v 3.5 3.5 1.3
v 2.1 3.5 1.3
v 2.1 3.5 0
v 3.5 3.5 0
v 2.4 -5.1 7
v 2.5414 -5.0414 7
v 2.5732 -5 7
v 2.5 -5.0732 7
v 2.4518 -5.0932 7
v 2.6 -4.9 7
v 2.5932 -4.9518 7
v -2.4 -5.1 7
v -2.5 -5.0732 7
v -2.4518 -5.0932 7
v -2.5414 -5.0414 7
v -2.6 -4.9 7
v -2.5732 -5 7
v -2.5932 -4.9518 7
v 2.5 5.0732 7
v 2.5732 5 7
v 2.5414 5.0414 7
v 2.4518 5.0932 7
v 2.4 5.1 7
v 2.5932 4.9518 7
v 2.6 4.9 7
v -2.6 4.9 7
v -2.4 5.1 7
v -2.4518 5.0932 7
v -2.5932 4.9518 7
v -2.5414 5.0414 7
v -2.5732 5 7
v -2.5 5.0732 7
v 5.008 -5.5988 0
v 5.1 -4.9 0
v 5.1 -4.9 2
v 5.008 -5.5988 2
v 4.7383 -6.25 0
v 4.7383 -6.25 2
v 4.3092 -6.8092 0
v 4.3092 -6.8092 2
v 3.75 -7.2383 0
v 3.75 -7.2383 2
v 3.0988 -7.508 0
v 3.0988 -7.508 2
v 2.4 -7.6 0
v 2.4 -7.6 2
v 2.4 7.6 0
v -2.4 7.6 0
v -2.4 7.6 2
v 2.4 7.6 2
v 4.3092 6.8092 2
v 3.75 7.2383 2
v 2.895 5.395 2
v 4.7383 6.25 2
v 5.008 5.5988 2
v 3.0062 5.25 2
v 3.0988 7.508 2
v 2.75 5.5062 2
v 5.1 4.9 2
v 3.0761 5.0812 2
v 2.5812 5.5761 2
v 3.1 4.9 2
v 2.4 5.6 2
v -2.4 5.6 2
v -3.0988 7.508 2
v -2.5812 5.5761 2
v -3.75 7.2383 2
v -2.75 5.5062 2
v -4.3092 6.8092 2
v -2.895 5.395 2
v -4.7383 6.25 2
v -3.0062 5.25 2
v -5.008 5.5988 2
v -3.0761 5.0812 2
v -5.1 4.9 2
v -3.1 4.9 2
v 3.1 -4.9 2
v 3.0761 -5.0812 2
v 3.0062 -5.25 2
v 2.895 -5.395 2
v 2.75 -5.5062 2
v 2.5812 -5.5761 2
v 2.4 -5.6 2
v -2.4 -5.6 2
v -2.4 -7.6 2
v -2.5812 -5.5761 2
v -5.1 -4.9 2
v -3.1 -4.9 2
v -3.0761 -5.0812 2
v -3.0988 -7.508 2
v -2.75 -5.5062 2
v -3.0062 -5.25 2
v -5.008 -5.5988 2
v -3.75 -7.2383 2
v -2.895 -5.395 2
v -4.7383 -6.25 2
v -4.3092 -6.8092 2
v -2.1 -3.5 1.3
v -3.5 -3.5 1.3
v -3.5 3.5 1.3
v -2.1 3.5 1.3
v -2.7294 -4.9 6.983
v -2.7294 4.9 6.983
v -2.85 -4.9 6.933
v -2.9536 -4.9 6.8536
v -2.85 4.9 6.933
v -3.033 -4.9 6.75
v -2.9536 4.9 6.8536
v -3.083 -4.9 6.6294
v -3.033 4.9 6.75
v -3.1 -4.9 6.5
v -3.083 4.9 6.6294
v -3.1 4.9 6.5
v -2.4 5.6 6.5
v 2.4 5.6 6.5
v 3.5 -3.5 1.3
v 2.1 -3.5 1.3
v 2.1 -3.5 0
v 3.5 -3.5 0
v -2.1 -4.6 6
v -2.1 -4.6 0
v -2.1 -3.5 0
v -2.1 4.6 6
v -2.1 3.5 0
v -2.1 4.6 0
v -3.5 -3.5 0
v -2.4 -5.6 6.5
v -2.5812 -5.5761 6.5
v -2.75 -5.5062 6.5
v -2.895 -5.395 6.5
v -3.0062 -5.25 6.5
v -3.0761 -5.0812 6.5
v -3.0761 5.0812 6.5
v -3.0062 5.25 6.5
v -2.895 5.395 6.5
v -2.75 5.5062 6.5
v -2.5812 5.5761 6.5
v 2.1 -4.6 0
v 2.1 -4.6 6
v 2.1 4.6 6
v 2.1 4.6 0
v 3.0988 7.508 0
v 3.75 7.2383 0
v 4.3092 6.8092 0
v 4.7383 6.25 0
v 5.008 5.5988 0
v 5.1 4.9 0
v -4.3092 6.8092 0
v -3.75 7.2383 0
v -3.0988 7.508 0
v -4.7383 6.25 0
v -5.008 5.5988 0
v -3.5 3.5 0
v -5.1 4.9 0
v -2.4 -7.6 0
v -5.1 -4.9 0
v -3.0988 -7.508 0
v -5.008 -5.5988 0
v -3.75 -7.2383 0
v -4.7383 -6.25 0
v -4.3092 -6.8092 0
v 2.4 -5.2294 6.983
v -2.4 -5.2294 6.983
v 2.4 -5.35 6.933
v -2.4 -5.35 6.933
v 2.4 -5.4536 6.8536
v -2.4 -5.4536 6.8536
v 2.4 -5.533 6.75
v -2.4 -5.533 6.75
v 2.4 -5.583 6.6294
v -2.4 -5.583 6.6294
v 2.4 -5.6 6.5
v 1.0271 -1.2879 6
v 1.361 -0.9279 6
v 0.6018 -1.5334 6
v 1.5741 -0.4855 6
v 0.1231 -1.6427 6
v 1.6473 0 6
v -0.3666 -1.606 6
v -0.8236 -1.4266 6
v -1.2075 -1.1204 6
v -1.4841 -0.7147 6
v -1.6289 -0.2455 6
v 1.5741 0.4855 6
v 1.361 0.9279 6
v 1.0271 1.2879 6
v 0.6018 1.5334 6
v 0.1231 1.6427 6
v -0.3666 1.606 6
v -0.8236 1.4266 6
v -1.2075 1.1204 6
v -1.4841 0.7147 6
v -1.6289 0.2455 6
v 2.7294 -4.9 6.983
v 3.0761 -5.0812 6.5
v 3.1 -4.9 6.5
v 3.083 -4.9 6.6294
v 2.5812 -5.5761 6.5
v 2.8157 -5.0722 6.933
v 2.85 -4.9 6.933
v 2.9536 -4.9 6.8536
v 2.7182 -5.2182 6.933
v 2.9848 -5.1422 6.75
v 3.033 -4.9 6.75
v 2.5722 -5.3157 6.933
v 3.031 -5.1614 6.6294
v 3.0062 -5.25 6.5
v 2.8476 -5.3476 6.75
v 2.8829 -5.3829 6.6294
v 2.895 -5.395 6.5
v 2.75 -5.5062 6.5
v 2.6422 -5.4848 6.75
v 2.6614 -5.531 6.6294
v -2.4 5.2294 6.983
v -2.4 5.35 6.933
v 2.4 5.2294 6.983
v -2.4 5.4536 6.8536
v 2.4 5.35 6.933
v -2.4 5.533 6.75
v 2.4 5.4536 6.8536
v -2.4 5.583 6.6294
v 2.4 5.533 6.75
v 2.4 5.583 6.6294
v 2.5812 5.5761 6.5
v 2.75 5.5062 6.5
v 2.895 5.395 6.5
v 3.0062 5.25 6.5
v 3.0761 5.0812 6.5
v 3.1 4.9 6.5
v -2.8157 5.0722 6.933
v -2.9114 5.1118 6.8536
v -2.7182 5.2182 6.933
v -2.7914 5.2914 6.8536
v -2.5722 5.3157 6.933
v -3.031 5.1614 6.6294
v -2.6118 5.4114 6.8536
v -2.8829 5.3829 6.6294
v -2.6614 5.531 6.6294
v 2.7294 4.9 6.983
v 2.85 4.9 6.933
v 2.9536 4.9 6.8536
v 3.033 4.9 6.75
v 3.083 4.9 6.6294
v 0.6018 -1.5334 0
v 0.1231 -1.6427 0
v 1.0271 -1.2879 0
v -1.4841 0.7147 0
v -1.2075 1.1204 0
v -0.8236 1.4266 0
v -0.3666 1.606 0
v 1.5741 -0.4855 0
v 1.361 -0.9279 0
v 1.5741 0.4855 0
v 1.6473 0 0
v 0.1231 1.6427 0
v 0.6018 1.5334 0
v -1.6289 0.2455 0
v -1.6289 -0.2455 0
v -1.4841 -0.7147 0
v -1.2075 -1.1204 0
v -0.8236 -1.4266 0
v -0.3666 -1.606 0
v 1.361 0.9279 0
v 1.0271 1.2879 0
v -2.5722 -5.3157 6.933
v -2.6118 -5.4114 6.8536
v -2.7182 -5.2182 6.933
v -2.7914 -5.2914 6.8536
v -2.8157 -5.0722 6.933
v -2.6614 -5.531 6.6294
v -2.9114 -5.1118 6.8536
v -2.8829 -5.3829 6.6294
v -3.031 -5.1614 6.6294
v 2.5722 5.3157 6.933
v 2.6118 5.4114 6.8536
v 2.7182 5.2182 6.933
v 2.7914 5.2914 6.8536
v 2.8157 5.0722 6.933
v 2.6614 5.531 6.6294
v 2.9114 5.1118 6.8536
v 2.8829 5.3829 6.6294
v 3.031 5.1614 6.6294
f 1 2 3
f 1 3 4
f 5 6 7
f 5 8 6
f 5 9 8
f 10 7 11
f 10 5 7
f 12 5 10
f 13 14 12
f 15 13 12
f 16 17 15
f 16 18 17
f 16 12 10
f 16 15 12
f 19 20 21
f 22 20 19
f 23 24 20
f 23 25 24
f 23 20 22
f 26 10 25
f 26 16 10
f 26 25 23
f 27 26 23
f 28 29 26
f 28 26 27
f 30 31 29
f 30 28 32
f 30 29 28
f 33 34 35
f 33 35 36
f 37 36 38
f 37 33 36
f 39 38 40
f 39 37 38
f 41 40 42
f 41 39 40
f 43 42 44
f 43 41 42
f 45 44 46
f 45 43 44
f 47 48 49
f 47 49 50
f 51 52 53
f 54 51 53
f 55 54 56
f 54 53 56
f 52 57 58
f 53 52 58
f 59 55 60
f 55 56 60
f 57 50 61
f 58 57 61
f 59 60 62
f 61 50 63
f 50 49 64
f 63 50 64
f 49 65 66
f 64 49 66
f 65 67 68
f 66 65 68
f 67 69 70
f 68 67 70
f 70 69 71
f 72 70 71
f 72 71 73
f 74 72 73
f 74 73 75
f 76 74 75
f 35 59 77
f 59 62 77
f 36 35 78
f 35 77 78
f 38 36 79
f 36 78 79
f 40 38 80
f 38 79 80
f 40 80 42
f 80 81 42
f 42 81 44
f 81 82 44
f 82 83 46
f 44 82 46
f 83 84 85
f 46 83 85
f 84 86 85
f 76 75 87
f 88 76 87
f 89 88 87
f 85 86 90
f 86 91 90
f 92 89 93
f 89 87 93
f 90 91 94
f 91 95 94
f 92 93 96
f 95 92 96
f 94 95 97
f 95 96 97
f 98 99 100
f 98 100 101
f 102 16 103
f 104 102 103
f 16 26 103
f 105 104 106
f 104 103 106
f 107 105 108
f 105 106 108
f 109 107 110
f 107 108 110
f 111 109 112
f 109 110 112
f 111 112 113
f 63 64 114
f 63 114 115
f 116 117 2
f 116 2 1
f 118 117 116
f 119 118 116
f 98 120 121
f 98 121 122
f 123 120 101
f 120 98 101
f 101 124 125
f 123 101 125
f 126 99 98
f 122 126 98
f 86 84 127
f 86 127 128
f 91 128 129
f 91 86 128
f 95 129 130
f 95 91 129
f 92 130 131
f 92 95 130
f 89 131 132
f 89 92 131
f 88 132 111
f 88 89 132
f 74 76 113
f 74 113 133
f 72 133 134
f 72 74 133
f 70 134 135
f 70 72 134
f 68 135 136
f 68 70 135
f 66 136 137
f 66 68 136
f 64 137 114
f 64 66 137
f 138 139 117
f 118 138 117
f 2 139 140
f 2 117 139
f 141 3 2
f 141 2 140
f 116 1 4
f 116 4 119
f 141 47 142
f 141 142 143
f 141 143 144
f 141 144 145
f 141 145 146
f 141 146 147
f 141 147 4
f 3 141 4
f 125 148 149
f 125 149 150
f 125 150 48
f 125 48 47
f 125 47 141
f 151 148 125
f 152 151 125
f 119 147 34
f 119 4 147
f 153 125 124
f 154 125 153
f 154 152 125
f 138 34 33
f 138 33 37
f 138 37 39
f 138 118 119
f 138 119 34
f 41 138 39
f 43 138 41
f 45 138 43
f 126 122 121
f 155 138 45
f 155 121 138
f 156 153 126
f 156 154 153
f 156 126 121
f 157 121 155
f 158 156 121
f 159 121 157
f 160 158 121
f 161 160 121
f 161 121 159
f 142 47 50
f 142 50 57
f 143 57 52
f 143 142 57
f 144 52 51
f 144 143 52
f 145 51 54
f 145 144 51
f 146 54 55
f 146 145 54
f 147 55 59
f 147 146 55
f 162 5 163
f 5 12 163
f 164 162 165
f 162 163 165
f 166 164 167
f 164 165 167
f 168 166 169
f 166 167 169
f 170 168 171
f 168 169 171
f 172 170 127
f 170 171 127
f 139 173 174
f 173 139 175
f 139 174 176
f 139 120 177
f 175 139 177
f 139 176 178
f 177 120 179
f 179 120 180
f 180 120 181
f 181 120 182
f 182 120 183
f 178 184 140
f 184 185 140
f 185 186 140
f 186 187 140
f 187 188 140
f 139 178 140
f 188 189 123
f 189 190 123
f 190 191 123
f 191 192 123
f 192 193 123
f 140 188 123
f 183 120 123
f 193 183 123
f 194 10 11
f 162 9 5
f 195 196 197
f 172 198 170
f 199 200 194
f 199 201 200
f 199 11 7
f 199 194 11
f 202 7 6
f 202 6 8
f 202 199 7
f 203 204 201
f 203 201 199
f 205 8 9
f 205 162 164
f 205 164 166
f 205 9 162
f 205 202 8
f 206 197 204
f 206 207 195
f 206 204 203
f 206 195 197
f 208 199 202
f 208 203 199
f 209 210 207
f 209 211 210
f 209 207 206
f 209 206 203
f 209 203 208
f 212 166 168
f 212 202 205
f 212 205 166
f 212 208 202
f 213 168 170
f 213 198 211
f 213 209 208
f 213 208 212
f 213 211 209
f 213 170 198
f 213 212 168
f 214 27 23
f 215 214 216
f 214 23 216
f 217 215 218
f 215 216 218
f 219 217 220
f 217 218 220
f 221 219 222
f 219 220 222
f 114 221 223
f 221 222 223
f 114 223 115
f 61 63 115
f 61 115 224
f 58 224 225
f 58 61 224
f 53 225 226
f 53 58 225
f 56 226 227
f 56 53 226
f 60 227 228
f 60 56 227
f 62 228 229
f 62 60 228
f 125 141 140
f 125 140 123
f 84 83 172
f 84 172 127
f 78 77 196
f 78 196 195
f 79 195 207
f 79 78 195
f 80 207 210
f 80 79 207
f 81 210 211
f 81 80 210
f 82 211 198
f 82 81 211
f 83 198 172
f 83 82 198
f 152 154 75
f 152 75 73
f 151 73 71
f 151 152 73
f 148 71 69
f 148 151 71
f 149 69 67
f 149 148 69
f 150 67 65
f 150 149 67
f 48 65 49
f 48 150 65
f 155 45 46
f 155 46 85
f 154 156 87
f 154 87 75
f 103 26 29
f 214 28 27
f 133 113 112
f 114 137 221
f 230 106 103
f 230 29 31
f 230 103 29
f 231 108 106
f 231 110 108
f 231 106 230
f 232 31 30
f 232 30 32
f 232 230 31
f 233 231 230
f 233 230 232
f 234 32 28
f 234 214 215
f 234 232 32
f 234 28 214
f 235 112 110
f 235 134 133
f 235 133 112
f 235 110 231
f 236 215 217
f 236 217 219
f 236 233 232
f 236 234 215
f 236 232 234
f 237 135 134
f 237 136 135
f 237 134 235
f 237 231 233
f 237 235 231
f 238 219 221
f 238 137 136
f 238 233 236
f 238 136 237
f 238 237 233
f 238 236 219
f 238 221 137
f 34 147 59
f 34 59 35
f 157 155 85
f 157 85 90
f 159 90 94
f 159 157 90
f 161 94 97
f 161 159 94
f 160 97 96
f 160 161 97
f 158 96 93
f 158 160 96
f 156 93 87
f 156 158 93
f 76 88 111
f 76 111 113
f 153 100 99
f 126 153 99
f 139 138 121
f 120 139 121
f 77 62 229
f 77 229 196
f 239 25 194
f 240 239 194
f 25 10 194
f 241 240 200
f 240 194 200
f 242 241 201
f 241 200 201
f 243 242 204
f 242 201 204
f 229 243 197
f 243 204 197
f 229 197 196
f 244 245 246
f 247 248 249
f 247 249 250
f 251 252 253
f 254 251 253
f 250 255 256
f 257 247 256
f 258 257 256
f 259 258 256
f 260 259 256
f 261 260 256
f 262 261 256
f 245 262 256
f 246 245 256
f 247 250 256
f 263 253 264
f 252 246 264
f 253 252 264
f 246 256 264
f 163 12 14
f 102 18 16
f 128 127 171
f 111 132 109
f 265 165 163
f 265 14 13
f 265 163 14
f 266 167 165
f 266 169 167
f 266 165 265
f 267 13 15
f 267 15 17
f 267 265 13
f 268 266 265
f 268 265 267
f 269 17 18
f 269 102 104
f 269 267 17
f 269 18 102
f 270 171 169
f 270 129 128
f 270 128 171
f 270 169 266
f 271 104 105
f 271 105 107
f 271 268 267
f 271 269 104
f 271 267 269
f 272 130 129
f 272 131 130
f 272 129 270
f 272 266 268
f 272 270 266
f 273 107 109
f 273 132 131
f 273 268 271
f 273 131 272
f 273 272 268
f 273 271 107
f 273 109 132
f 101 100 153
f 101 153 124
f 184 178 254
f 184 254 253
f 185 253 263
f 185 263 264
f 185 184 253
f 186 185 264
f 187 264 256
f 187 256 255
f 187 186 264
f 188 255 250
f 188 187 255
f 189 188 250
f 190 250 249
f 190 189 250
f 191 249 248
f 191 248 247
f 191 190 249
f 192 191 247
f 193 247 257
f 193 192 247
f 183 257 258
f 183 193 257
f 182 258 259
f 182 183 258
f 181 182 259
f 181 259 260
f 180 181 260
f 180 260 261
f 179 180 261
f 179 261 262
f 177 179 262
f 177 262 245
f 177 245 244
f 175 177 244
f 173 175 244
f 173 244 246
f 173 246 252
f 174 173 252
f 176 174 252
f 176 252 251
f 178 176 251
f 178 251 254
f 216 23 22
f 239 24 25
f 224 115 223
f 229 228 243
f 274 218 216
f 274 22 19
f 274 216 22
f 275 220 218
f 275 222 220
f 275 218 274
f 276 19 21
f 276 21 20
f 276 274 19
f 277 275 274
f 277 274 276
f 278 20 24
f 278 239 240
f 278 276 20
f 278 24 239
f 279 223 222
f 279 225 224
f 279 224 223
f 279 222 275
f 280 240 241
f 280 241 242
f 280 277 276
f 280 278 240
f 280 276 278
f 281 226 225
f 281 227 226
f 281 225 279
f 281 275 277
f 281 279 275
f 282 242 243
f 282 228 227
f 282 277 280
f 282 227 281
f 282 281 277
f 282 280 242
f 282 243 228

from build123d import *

# Parameters (mm, degrees)
CROQUIS1_W              = 9.2
CROQUIS1_H              = 4.2
SALIENTE_EXTRUIR1_DEPTH = 7
SALIENTE_EXTRUIR2_DEPTH = 2
SALIENTE_EXTRUIR3_START = 7
CROQUIS1_5_W            = 9.2
CROQUIS1_5_H            = 4.2
CROQUIS1_5_R            = 1.647263677
SALIENTE_EXTRUIR3_DEPTH = 1
SALIENTE_EXTRUIR4_START = 7
CROQUIS1_6_R            = 1.647263677
SALIENTE_EXTRUIR4_DEPTH = 7
CORTAR_EXTRUIR1_START   = -1.3
CROQUIS2_W              = 4.2
CROQUIS2_H              = 7
CROQUIS2_R              = 1.647263677
CROQUIS2_W_2            = 1.4
CORTAR_EXTRUIR1_DEPTH   = 1.3
REDONDEO1_R             = 0.5


with BuildPart() as part:
    # Croquis1 → Saliente-Extruir1 (new body)
    with BuildSketch(Plane(origin=(0, 0, 0), x_dir=(0, 1, 0), z_dir=(0, 0, 1))):
        with BuildLine():
            ThreePointArc((-5.6, 2.4), (-5.394974747, 2.894974747), (-4.9, 3.1))
            Line((-4.9, 3.1), (4.9, 3.1))
            ThreePointArc((4.9, 3.1), (5.394974747, 2.894974747), (5.6, 2.4))
            Line((5.6, 2.4), (5.6, -2.4))
            ThreePointArc((5.6, -2.4), (5.394974747, -2.894974747), (4.9, -3.1))
            Line((4.9, -3.1), (-4.9, -3.1))
            ThreePointArc((-4.9, -3.1), (-5.394974747, -2.894974747), (-5.6, -2.4))
            Line((-5.6, -2.4), (-5.6, 2.4))
        make_face()
        Rectangle(CROQUIS1_W, CROQUIS1_H, mode=Mode.SUBTRACT)
    extrude(amount=SALIENTE_EXTRUIR1_DEPTH)

    # Croquis1<4> → Saliente-Extruir2 (add)
    with BuildSketch(Plane(origin=(0, 0, 0), x_dir=(0, 1, 0), z_dir=(0, 0, 1))):
        with BuildLine():
            ThreePointArc((-4.9, -5.1), (-6.809188309, -4.309188309), (-7.6, -2.4))
            Line((-7.6, -2.4), (-7.6, 2.4))
            ThreePointArc((-7.6, 2.4), (-6.809188309, 4.309188309), (-4.9, 5.1))
            Line((-4.9, 5.1), (4.9, 5.1))
            ThreePointArc((4.9, 5.1), (6.809188309, 4.309188309), (7.6, 2.4))
            Line((7.6, 2.4), (7.6, -2.4))
            ThreePointArc((7.6, -2.4), (6.809188309, -4.309188309), (4.9, -5.1))
            Line((4.9, -5.1), (-4.9, -5.1))
        make_face()
        with BuildLine():
            Line((-5.6, -2.4), (-5.6, 2.4))
            ThreePointArc((-5.6, 2.4), (-5.394974747, 2.894974747), (-4.9, 3.1))
            Line((-4.9, 3.1), (4.9, 3.1))
            ThreePointArc((4.9, 3.1), (5.394974747, 2.894974747), (5.6, 2.4))
            Line((5.6, 2.4), (5.6, -2.4))
            ThreePointArc((5.6, -2.4), (5.394974747, -2.894974747), (4.9, -3.1))
            Line((4.9, -3.1), (-4.9, -3.1))
            ThreePointArc((-4.9, -3.1), (-5.394974747, -2.894974747), (-5.6, -2.4))
        make_face(mode=Mode.SUBTRACT)
    extrude(amount=SALIENTE_EXTRUIR2_DEPTH)

    # Croquis1<5> → Saliente-Extruir3 (add)
    with BuildSketch(Plane(origin=(0, 0, 0), x_dir=(0, 1, 0), z_dir=(0, 0, 1)).offset(SALIENTE_EXTRUIR3_START)):
        Rectangle(CROQUIS1_5_W, CROQUIS1_5_H)
        with Locations(Location((0, 0, 0), (0, 0, 270))):
            Circle(CROQUIS1_5_R, mode=Mode.SUBTRACT)
    extrude(amount=-SALIENTE_EXTRUIR3_DEPTH)

    # Croquis1<6> → Saliente-Extruir4 (add)
    with BuildSketch(Plane(origin=(0, 0, 0), x_dir=(0, 1, 0), z_dir=(0, 0, 1)).offset(SALIENTE_EXTRUIR4_START)):
        with Locations(Location((0, 0, 0), (0, 0, 270))):
            Circle(CROQUIS1_6_R)
    extrude(amount=-SALIENTE_EXTRUIR4_DEPTH)

    # Croquis2 → Cortar-Extruir1 (cut)
    # profile 1 of 3: a face of its own
    with BuildSketch(Plane(origin=(0, 0, 0), x_dir=(1, 0, 0), z_dir=(0, 0, -1)).offset(CORTAR_EXTRUIR1_START)):
        Rectangle(CROQUIS2_W, CROQUIS2_H)
        Circle(CROQUIS2_R, mode=Mode.SUBTRACT)
    # profile 2 of 3: a face of its own
    with BuildSketch(Plane(origin=(0, 0, 0), x_dir=(1, 0, 0), z_dir=(0, 0, -1)).offset(CORTAR_EXTRUIR1_START)):
        with Locations((-2.8, 0)):
            Rectangle(CROQUIS2_W_2, CROQUIS2_H)
    # profile 3 of 3: a face of its own
    with BuildSketch(Plane(origin=(0, 0, 0), x_dir=(1, 0, 0), z_dir=(0, 0, -1)).offset(CORTAR_EXTRUIR1_START)):
        with Locations((2.8, 0)):
            Rectangle(CROQUIS2_W_2, CROQUIS2_H)
    extrude(amount=CORTAR_EXTRUIR1_DEPTH, mode=Mode.SUBTRACT)

    # Redondeo1
    redondeo1_edges = [part.edges().sort_by_distance(p)[0] for p in [
        (0, -5.6, 7),
        (2.894974747, -5.394974747, 7),
        (3.1, 0, 7),
        (2.894974747, 5.394974747, 7),
        (0, 5.6, 7),
        (-2.894974747, 5.394974747, 7),
        (-3.1, 0, 7),
        (-2.894974747, -5.394974747, 7),
    ]]
    fillet(redondeo1_edges, radius=REDONDEO1_R)


solid = part.part
